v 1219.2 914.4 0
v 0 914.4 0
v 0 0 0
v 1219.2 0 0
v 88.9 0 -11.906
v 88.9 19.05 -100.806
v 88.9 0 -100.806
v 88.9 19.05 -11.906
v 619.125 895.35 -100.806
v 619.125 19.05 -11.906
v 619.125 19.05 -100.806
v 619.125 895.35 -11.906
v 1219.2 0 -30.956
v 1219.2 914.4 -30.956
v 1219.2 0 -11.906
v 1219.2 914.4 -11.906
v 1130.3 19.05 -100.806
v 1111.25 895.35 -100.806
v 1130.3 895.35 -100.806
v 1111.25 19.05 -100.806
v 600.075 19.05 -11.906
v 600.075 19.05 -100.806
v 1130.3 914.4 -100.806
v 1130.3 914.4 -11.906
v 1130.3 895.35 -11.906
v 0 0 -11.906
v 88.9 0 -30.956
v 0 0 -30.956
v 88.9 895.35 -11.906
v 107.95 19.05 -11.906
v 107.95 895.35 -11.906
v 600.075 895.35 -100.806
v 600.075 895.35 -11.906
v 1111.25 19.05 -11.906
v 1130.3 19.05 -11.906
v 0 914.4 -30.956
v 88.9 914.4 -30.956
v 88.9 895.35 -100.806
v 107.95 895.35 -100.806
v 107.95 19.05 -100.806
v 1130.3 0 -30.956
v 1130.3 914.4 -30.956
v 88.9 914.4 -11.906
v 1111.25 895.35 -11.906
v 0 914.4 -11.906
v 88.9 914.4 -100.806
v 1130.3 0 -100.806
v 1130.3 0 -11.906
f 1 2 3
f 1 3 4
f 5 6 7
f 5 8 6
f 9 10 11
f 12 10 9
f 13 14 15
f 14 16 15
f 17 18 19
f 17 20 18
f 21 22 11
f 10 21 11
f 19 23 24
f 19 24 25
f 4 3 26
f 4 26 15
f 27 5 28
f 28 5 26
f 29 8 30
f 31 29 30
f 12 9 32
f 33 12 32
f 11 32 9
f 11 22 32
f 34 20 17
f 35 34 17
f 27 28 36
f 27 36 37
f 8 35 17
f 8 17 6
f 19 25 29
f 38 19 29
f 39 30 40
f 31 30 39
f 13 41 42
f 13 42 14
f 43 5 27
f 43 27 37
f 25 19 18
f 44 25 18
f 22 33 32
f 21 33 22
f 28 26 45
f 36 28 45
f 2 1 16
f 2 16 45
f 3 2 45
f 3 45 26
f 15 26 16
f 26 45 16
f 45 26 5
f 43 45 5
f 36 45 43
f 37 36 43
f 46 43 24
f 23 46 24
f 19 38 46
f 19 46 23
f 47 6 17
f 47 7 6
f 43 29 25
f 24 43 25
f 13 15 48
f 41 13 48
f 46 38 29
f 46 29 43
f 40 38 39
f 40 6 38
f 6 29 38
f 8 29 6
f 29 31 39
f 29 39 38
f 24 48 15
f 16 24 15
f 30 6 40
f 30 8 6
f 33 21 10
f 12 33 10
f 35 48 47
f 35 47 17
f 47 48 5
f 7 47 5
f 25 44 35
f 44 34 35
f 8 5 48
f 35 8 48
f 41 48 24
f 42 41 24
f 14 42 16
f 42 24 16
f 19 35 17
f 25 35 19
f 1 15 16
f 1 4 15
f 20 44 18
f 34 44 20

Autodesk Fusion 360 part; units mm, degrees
sketch "Sketch1" plane through (0, 0, 0) normal (0, 0, 1) x (1, 0, 0) in component "Component"
  line L0 (0, 0) -> (1219.2, 0)
  line L1 (1219.2, 0) -> (1219.2, 914.4)
  line L2 (1219.2, 914.4) -> (0, 914.4)
  line L3 (0, 914.4) -> (0, 0)
  dimension "d6" = 1219.2
  dimension "d7" = 914.4
extrude "Extrude1" add sketch "Sketch1" against normal blind 11.9062 makes body 1 in component "Component"
sketch "Sketch1 (2)" plane through (0, 0, -11.9062) normal (0, 0, -1) x (1, 0, 0) in component "Component'"
  line L0 (0, 0) -> (0, -914.4)
  line L1 (0, -914.4) -> (1219.2, -914.4)
  line L2 (1219.2, -914.4) -> (1219.2, 0)
  line L3 (1219.2, 0) -> (0, 0)
  line L4 (0, 0) -> (88.9, 0)
  line L5 (88.9, 0) -> (88.9, -914.4)
  line L6 (88.9, -914.4) -> (0, -914.4)
  line L7 (0, -914.4) -> (0, 0)
  line L8 (609.6, 0) -> (609.6, -914.4) construction
  line L9 (1219.2, -914.4) -> (1219.2, 0)
  line L10 (1219.2, 0) -> (1130.3, 0)
  line L11 (1130.3, 0) -> (1130.3, -914.4)
  line L12 (1130.3, -914.4) -> (1219.2, -914.4)
  dimension "d10" = 914.4
  dimension "d11" = 88.9
extrude "Extrude1'" add sketch "Sketch1 (2)" along normal blind 19.05 separate body contours L0 L1 L3 L4 L5 L6 L7 | L1 L2 L3 L9 L10 L11 L12 makes body 2 at (1159.9333, 304.8, -11.9062) makes body 3 at (59.2667, 609.6, -11.9062) in component "Component'"
sketch "Sketch1 (3)" plane through (0, 0, -11.9062) normal (0, 0, -1) x (1, 0, 0) in component "Component'''"
  line L0 (0, 0) -> (0, -914.4)
  line L1 (0, -914.4) -> (1219.2, -914.4)
  line L2 (1219.2, -914.4) -> (1219.2, 0)
  line L3 (1219.2, 0) -> (0, 0)
  line L4 (88.9, 0) -> (1130.3, 0)
  line L5 (1130.3, 0) -> (1130.3, -19.05)
  line L6 (1130.3, -19.05) -> (88.9, -19.05)
  line L7 (88.9, -19.05) -> (88.9, 0)
  line L8 (0, -457.2) -> (1219.2, -457.2) construction
  line L9 (1130.3, -895.35) -> (88.9, -895.35)
  line L10 (88.9, -914.4) -> (1130.3, -914.4)
  line L11 (88.9, -895.35) -> (88.9, -914.4)
  line L12 (1130.3, -914.4) -> (1130.3, -895.35)
  dimension "d14" = 19.05
  dimension "d24" = 1041.4
extrude "Extrude1''" add sketch "Sketch1 (3)" along normal blind 88.9 separate body contours L3 L4 L5 L6 L7 | L1 L9 L10 L11 L12 makes body 4 at (783.1667, 895.35, -41.5396) makes body 5 at (783.1667, 0, -41.5396) in component "Component'''"
sketch "Sketch2" plane through (0, 0, -11.9062) normal (0, 0, -1) x (1, 0, 0) in component "Component''"
  line L0 (0, 0) -> (0, -914.4)
  line L1 (0, -914.4) -> (1219.2, -914.4)
  line L2 (1219.2, -914.4) -> (1219.2, 0)
  line L3 (1219.2, 0) -> (0, 0)
  line L4 (88.9, -19.05) -> (107.95, -19.05)
  line L5 (107.95, -19.05) -> (107.95, -895.35)
  line L6 (107.95, -895.35) -> (88.9, -895.35)
  line L7 (88.9, -895.35) -> (88.9, -19.05)
  line L8 (1130.3, -895.35) -> (88.9, -895.35)
  line L9 (600.075, -895.35) -> (600.075, -19.05)
  line L10 (619.125, -19.05) -> (619.125, -895.35)
  line L11 (619.125, -895.35) -> (600.075, -895.35)
  line L12 (600.075, -19.05) -> (619.125, -19.05)
  line L13 (1111.25, -895.35) -> (1111.25, -19.05)
  line L14 (1130.3, -19.05) -> (1130.3, -895.35)
  line L15 (1130.3, -895.35) -> (1111.25, -895.35)
  line L16 (1111.25, -19.05) -> (1130.3, -19.05)
  dimension "d17" = 19.05
  dimension "d20" = 1022.35
  dimension "d21" = 0
extrude "Extrude1'''" add sketch "Sketch2" along normal blind 88.9 separate body contours L8 L13 L14 L15 L16 | L8 L9 L10 L11 L12 | L4 L5 L6 L7 L8 makes body 6 at (1111.25, 603.25, -41.5396) makes body 7 at (600.075, 603.25, -41.5396) makes body 8 at (107.95, 311.15, -41.5396) in component "Component''"
component "Component" placed x (1, 0, 0) y (0, 1, 0) z (0, 0, 1) at (0, 0, 0)
component "Component'" placed x (1, 0, 0) y (0, 1, 0) z (0, 0, 1) at (0, 0, 0)
component "Component''" placed x (1, 0, 0) y (0, 1, 0) z (0, 0, 1) at (0, 0, 0)
component "Component'''" placed x (1, 0, 0) y (0, 1, 0) z (0, 0, 1) at (0, 0, 0)
equation "workbenchWidth = 36 in"
equation "workbenchLength = 48 in"
equation "plywoodThickness = ( 15 / 32 ) * 1 in"
equation "_1x = 0.75 in"
equation "x4 = 3.5 in"
equation "d6 = workbenchLength"
equation "d7 = workbenchWidth"
equation "d8 = -1 * plywoodThickness"
equation "d10 = workbenchWidth"
equation "d11 = x4"
equation "d12 = _1x"
equation "d14 = _1x"
equation "d15 = x4"
equation "d17 = _1x"
equation "d20 = workbenchLength - ( 2 * x4 ) - _1x"
equation "d22 = x4"
equation "d24 = workbenchLength - ( 2 * x4 )"
